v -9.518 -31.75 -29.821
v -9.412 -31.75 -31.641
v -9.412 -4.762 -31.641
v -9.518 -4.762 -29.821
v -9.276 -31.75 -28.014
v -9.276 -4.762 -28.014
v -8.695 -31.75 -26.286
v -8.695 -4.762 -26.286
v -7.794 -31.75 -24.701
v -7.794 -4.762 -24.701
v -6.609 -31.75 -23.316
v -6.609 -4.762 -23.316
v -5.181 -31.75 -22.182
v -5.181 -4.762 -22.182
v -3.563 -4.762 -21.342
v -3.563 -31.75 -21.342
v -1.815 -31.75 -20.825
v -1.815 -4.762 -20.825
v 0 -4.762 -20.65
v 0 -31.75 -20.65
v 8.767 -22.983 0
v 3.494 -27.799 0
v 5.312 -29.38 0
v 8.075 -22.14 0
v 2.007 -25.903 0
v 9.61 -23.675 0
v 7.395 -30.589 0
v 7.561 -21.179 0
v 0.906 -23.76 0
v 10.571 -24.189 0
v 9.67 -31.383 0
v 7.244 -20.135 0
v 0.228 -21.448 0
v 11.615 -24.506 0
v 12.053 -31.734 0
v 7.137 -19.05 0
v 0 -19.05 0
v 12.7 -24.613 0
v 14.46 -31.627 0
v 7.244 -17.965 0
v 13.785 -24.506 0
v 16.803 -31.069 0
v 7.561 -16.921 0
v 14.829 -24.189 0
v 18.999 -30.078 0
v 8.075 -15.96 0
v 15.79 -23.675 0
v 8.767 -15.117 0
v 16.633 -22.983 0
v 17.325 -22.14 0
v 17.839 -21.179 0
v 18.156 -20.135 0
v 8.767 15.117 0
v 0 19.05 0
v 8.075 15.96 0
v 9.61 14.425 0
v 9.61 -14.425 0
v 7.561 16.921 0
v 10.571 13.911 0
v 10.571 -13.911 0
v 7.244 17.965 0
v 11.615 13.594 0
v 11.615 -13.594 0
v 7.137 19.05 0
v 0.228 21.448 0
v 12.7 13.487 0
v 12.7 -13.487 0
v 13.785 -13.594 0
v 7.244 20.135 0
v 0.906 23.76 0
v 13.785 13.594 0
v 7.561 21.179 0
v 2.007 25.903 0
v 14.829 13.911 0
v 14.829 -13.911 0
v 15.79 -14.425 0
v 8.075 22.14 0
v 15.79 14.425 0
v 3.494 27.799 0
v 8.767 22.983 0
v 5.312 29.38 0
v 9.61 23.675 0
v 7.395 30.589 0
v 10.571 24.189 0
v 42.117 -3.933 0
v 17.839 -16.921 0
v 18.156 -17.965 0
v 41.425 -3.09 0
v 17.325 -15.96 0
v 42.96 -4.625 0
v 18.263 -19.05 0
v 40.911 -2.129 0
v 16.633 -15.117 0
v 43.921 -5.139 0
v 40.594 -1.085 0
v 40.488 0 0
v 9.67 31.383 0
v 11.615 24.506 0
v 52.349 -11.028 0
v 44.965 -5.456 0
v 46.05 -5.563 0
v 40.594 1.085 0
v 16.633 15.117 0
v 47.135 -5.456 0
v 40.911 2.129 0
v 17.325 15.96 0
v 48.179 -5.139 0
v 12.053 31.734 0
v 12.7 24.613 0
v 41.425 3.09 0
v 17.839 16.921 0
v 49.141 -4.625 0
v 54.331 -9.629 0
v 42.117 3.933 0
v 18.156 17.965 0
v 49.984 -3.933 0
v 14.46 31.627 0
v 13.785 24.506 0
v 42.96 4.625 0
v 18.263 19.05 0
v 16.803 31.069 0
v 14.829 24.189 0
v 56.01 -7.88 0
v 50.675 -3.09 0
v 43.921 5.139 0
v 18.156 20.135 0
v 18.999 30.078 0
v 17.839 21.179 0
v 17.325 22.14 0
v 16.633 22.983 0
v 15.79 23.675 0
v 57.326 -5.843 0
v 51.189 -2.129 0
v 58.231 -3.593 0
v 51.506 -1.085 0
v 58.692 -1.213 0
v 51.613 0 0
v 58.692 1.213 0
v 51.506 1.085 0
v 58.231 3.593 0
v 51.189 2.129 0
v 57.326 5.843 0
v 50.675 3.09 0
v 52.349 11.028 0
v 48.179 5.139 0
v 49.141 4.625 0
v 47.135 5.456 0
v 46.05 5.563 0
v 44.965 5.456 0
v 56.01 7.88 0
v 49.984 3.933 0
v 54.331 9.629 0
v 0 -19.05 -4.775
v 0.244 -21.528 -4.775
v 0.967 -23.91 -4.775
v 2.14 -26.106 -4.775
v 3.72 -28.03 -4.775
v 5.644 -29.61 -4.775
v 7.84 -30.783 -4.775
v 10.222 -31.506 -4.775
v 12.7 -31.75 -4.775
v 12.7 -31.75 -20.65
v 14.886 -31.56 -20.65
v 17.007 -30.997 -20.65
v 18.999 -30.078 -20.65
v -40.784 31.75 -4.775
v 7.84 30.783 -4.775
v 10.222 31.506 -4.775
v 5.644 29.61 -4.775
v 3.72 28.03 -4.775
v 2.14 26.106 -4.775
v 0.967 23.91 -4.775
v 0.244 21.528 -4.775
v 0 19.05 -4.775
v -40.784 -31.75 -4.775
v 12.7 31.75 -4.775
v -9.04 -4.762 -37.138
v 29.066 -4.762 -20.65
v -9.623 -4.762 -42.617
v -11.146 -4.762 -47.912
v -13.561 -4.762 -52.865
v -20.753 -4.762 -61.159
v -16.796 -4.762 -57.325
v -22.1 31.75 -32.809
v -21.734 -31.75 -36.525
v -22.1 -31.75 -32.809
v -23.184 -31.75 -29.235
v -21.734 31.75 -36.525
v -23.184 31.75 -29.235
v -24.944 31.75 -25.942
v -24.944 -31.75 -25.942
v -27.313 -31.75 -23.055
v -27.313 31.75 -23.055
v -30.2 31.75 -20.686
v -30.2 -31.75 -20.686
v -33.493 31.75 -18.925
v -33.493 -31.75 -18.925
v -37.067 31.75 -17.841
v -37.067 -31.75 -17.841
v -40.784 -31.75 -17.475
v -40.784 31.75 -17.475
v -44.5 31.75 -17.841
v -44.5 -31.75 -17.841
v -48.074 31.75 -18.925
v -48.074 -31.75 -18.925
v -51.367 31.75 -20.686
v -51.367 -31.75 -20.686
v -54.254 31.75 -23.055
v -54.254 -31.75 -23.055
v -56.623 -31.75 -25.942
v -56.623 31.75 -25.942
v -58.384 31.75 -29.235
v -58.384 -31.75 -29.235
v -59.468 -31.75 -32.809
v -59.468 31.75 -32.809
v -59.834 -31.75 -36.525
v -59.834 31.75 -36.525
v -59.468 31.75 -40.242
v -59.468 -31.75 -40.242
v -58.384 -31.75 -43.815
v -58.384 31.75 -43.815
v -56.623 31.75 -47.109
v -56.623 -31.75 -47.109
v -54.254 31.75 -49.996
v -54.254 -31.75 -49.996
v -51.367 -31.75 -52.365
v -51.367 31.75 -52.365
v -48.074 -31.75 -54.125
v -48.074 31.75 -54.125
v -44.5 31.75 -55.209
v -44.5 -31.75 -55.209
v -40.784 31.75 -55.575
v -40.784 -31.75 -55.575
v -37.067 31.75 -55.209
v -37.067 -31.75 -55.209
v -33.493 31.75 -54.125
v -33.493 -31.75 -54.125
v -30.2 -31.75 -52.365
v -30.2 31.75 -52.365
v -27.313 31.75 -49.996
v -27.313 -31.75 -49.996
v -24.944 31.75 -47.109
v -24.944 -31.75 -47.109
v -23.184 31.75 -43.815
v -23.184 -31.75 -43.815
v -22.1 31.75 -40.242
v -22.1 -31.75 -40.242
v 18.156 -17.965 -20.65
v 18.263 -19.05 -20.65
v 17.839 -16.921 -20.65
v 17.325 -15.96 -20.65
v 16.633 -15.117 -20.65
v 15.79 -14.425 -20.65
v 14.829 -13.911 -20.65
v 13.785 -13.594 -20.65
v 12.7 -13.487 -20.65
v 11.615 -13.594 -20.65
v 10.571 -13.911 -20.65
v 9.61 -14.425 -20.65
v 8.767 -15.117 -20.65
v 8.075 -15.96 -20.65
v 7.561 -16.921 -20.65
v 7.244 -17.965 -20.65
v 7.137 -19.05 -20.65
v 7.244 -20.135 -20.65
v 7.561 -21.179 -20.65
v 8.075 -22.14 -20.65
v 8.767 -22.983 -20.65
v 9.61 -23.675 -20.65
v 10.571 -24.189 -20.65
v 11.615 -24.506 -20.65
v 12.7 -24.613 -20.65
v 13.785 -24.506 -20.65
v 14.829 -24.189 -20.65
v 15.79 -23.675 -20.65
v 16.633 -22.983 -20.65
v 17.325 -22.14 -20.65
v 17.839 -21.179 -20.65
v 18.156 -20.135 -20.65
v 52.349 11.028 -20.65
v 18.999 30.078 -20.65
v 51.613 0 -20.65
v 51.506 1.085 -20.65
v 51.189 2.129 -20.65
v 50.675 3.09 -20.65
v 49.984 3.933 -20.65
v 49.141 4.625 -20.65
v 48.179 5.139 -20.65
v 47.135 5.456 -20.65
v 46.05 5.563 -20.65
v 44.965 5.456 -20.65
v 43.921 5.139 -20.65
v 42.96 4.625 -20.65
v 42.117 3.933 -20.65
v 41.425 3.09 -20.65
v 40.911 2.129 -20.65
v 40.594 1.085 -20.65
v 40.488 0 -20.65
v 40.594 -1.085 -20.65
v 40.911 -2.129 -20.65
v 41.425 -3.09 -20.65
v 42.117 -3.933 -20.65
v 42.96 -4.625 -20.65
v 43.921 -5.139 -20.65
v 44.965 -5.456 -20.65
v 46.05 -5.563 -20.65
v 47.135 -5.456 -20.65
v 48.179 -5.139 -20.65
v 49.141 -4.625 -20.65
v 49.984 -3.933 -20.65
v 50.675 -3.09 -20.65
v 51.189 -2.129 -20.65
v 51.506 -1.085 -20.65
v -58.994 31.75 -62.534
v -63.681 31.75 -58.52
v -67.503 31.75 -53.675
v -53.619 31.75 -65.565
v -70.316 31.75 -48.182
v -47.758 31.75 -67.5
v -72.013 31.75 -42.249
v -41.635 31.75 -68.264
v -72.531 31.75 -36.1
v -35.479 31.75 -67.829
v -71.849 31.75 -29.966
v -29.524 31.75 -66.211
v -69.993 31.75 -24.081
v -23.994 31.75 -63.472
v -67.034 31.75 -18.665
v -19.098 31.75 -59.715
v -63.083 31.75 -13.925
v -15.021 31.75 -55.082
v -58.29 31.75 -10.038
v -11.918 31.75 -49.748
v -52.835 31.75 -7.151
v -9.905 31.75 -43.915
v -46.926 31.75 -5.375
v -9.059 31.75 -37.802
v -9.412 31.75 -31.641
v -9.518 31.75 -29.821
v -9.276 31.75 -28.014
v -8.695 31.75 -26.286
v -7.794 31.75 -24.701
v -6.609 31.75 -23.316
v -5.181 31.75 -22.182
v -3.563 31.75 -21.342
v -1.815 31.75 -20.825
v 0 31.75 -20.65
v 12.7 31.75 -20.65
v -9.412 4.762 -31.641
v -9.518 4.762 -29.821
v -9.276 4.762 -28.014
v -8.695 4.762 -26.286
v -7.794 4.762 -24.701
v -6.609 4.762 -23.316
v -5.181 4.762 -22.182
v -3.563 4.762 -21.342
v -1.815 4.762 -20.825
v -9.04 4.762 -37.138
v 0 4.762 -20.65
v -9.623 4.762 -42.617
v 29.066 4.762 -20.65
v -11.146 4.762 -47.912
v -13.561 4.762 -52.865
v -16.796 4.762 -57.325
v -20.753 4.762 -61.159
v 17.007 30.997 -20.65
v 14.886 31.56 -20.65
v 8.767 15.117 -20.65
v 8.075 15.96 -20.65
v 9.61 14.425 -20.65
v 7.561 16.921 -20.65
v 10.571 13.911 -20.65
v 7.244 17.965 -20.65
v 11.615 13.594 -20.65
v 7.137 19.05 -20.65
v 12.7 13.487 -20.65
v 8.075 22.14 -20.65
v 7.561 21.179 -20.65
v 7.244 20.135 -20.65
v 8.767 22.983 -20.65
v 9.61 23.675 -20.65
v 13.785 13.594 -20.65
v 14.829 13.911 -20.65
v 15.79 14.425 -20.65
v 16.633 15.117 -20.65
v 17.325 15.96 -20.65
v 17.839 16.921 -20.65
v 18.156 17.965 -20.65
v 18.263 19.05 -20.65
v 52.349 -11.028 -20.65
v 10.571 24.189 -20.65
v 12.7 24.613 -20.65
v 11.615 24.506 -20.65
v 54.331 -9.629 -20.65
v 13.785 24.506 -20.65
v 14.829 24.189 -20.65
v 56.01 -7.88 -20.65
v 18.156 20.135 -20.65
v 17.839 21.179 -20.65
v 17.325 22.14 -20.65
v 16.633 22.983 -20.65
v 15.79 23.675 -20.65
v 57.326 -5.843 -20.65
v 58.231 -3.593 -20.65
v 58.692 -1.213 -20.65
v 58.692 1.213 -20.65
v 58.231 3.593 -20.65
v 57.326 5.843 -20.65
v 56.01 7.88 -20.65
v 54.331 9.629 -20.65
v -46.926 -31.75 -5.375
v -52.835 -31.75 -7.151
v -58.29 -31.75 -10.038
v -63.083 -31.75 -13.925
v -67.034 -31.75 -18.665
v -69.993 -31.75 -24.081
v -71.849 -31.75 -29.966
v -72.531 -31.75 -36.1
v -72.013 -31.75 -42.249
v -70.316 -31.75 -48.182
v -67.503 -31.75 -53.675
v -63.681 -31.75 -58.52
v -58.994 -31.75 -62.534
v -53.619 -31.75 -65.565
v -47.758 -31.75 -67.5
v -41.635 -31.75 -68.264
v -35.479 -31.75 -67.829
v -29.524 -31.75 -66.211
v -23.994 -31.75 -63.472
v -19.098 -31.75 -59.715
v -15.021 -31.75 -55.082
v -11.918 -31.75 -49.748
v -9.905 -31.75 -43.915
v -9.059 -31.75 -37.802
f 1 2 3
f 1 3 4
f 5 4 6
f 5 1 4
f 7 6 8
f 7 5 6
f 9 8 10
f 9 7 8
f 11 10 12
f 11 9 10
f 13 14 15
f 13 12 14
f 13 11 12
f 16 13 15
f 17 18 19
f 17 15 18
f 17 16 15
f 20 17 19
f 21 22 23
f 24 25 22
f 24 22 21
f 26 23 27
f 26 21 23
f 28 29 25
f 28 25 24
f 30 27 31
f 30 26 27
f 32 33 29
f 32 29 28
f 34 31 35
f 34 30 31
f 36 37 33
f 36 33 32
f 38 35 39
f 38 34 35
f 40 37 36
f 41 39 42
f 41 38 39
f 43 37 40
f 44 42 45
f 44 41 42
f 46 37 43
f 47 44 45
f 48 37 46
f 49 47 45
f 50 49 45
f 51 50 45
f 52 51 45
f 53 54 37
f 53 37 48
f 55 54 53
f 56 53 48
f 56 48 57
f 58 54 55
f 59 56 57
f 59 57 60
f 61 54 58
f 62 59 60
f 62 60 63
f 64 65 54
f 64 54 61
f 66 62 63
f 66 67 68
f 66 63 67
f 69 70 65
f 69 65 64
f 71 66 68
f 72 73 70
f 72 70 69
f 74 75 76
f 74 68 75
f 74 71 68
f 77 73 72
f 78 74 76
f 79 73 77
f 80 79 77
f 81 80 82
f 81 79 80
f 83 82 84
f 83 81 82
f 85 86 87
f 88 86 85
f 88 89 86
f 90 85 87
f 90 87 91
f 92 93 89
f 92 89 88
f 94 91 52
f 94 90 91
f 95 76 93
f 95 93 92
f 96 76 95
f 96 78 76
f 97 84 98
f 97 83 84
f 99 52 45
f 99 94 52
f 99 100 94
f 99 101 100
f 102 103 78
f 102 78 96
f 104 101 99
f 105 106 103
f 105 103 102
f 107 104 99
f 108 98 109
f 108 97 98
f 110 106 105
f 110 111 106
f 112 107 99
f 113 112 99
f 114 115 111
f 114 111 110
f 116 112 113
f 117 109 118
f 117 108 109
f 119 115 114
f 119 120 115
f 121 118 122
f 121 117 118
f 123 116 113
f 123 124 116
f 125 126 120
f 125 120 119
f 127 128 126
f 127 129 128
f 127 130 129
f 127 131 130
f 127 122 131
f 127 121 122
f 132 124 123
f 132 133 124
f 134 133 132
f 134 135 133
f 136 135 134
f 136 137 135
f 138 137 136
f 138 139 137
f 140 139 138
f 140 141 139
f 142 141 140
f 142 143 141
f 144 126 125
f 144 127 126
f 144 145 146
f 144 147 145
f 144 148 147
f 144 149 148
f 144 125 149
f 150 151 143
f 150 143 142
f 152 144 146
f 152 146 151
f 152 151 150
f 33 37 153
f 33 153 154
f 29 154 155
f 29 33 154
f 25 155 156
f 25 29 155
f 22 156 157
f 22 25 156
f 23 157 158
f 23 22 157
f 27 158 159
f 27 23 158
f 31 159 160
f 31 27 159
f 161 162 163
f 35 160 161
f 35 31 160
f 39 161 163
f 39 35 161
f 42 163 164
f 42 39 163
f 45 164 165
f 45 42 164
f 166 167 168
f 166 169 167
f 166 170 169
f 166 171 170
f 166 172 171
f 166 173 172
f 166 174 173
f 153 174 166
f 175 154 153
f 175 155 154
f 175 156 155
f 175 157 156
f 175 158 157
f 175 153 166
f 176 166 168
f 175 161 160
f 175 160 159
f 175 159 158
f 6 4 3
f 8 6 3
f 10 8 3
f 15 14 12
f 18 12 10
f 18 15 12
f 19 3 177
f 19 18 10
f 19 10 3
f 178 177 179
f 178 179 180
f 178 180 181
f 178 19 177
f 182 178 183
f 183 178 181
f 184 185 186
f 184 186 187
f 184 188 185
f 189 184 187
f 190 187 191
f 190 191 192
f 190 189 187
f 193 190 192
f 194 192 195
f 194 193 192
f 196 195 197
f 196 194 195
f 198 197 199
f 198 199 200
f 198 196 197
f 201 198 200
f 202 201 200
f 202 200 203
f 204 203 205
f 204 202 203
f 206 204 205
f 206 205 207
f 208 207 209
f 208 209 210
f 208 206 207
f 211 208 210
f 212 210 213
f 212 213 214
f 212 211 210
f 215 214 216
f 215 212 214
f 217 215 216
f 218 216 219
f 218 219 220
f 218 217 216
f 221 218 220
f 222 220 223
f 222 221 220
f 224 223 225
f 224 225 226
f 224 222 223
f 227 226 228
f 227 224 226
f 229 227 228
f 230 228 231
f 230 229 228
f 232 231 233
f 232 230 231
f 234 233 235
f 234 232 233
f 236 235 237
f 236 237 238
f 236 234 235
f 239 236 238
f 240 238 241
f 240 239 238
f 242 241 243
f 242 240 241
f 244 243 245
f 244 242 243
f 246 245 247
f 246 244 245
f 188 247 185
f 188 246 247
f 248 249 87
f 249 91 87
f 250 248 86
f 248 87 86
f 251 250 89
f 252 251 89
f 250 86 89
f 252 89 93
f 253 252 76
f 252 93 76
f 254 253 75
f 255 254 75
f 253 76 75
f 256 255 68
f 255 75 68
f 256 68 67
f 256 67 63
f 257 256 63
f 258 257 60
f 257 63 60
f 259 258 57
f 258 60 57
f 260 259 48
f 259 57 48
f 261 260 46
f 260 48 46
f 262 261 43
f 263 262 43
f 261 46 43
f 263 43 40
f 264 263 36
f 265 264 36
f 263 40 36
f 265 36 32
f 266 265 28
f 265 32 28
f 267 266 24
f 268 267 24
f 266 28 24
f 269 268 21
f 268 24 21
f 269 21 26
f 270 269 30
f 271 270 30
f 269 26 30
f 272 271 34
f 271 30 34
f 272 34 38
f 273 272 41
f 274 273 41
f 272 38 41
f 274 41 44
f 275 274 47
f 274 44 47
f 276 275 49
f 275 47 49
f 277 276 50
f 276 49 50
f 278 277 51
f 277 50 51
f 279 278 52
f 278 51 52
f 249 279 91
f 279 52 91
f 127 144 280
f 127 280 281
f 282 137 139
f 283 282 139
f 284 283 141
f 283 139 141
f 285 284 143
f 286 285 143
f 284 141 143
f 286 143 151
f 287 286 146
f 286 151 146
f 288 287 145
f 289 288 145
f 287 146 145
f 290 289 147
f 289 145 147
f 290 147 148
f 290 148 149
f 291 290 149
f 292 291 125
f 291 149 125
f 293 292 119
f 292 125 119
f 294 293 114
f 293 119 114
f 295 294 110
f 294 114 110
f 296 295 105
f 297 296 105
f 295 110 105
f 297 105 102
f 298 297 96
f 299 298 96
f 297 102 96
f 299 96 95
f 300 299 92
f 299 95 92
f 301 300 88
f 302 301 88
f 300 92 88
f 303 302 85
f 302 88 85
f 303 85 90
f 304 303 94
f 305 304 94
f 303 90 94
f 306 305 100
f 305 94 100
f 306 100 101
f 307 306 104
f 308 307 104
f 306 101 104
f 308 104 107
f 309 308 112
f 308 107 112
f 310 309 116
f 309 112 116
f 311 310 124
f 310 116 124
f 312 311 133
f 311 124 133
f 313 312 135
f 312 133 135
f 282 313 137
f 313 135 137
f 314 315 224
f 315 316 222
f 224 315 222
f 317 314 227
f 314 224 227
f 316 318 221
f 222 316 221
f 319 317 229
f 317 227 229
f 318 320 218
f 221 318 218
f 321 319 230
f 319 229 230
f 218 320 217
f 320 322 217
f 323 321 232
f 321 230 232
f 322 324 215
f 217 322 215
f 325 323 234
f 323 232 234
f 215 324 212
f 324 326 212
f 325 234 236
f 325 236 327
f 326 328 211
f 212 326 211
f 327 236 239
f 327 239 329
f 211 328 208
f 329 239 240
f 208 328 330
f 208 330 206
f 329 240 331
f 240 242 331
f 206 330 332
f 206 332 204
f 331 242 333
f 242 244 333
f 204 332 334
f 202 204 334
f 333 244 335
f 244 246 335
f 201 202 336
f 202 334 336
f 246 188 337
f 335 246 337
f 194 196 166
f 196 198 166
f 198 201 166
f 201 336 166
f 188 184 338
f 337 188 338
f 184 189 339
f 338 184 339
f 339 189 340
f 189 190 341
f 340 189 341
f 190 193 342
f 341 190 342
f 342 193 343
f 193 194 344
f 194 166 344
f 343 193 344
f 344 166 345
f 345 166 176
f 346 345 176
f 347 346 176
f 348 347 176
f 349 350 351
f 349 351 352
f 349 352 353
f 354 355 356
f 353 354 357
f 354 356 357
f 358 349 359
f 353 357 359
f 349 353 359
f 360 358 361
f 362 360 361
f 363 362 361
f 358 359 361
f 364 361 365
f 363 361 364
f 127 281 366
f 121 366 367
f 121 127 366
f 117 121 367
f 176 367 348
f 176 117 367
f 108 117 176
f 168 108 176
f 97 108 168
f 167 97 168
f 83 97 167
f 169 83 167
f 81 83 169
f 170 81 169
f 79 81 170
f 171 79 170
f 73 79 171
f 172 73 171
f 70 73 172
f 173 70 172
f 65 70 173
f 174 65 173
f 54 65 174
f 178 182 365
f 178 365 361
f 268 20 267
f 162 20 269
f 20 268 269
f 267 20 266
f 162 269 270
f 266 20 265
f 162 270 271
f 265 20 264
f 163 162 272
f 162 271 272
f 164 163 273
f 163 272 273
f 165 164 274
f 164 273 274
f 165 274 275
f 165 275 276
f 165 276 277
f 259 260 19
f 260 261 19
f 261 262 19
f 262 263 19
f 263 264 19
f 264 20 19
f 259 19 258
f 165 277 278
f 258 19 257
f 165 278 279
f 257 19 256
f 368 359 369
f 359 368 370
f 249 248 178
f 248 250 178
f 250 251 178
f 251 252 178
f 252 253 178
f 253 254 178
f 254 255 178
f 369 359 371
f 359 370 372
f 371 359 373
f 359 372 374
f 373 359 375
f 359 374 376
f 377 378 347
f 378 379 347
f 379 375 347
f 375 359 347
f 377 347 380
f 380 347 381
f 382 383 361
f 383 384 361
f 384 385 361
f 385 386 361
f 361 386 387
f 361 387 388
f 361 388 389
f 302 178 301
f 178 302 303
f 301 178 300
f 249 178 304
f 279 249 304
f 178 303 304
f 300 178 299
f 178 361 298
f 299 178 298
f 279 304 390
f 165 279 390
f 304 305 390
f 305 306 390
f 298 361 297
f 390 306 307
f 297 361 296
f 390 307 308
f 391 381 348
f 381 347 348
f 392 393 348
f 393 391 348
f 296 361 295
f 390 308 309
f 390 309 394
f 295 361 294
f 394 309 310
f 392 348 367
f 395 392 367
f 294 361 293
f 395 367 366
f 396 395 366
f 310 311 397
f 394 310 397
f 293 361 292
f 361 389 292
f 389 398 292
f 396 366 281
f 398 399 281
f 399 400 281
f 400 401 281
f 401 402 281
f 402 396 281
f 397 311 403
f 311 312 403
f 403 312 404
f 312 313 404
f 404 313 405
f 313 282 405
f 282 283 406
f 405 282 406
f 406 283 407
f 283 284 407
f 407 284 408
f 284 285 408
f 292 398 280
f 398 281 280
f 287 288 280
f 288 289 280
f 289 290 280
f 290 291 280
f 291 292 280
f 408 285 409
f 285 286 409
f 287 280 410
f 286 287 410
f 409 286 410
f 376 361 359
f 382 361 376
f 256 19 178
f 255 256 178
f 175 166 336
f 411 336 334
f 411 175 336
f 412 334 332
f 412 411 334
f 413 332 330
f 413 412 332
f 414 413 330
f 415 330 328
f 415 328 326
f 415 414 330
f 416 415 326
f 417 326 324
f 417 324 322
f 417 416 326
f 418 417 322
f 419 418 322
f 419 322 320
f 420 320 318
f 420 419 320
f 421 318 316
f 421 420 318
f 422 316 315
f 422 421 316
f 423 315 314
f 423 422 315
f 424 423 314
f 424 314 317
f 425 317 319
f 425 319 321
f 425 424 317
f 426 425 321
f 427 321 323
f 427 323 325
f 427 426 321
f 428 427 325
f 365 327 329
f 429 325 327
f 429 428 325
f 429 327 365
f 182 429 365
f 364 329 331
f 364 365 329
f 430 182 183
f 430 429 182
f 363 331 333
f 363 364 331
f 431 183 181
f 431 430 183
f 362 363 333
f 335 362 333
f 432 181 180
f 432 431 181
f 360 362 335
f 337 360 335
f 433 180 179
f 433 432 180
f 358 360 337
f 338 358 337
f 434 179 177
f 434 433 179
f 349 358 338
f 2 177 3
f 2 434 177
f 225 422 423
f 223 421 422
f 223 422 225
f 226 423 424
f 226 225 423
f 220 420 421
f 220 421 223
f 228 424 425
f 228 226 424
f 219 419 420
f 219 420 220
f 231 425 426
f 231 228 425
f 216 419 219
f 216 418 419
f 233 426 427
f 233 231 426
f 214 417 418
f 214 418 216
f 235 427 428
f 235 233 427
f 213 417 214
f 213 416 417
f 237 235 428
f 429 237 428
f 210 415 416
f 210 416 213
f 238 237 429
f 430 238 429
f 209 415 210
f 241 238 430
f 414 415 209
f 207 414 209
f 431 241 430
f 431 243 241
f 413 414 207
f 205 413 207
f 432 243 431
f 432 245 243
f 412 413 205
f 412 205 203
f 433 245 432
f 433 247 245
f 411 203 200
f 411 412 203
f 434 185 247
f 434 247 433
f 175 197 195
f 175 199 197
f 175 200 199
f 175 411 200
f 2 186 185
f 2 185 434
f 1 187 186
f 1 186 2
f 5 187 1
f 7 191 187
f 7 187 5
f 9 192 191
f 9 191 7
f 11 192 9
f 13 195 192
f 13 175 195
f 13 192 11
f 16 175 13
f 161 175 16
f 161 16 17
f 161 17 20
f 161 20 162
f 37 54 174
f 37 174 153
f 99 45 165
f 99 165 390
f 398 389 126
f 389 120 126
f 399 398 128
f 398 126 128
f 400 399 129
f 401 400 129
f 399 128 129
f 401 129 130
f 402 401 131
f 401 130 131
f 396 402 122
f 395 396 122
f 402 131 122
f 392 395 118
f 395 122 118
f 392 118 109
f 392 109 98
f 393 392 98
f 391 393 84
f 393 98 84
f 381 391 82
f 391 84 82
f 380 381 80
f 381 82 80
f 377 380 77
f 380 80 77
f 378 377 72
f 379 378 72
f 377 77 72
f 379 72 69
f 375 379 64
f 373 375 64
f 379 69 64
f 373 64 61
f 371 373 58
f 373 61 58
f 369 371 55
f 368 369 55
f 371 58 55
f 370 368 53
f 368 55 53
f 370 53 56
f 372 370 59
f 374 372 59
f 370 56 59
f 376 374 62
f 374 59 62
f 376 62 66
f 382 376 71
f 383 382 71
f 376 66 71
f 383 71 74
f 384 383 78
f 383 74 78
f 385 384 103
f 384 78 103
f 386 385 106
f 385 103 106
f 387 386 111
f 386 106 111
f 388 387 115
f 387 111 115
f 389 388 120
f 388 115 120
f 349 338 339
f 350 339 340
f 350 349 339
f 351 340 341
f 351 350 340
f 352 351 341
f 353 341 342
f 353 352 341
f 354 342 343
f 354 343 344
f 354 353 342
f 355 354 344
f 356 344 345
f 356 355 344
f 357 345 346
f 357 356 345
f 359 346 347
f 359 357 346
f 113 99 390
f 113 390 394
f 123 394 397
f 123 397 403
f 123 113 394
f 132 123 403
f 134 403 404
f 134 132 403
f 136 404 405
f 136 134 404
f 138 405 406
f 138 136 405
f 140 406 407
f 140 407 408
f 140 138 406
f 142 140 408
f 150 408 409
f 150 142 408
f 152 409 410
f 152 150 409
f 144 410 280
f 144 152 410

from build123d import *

# Parameters (mm, degrees)
F0_R     = 5.5626
F1_DEPTH = 20.6502
F2_R     = 19.05
F3_DEPTH = 31.75
F5_DEPTH = 4.7625
F6_R     = 5.5626
F7_DEPTH = 68.2762


with BuildPart() as f1:
    # F0 (on Top) → F1 (new body)
    with BuildSketch(Plane.XY):
        with BuildLine():
            ThreePointArc((18.9991554441, 30.0777214642), (6.3246284085, 30.0338352623), (0, 19.05))
            Line((0, 19.05), (0, -19.05))
            ThreePointArc((0, -19.05), (6.3246284085, -30.0338352623), (18.9991554441, -30.0777214642))
            Line((18.9991554441, -30.0777214642), (52.3493554441, -11.0277214642))
            ThreePointArc((52.3493554441, -11.0277214642), (58.7502, 0), (52.3493554441, 11.0277214642))
            Line((52.3493554441, 11.0277214642), (18.9991554441, 30.0777214642))
        make_face()
        with Locations((12.7, -19.05)):
            Circle(F0_R, mode=Mode.SUBTRACT)
        with Locations((12.7, 19.05)):
            Circle(F0_R, mode=Mode.SUBTRACT)
        with Locations((46.0502, 0)):
            Circle(F0_R, mode=Mode.SUBTRACT)
    extrude(amount=-F1_DEPTH)

    # F2 (on Front) → F3 (join, symmetric)
    with BuildSketch(Plane.XZ):
        with BuildLine():
            Line((12.7, -4.7752), (-40.7836134373, -4.7752))
            ThreePointArc((-40.7836134373, -4.7752), (-61.4351988672, -60.6410561787), (-9.4116031009, -31.6405846154))
            ThreePointArc((-9.4116031009, -31.6405846154), (-7.2347568536, -23.979724371), (0, -20.6502))
            Line((0, -20.6502), (12.7, -20.6502))
            Line((12.7, -20.6502), (12.7, -4.7752))
        make_face()
        with Locations((-40.7836134373, -36.5252)):
            Circle(F2_R, mode=Mode.SUBTRACT)
    extrude(amount=F3_DEPTH, both=True)

    # F4 (on Front) → F5 (join, symmetric)
    with BuildSketch(Plane.XZ):
        with BuildLine():
            ThreePointArc((-9.4116031009, -31.6405846154), (-11.1459036377, -47.9124146654), (-20.7531221582, -61.1593616281))
            Line((-20.7531221582, -61.1593616281), (29.0663865627, -20.6502))
            Line((29.0663865627, -20.6502), (0, -20.6502))
            ThreePointArc((0, -20.6502), (-7.2347568536, -23.979724371), (-9.4116031009, -31.6405846154))
        make_face()
    extrude(amount=F5_DEPTH, both=True)

    # F6 (on face) → F7 (cut, through all)
    with BuildSketch(Plane.XY):
        with Locations((12.7, -19.05)):
            Circle(F6_R)
        with Locations((12.7, 19.05)):
            Circle(F6_R)
    extrude(amount=-F7_DEPTH, mode=Mode.SUBTRACT)


solid = f1.part
